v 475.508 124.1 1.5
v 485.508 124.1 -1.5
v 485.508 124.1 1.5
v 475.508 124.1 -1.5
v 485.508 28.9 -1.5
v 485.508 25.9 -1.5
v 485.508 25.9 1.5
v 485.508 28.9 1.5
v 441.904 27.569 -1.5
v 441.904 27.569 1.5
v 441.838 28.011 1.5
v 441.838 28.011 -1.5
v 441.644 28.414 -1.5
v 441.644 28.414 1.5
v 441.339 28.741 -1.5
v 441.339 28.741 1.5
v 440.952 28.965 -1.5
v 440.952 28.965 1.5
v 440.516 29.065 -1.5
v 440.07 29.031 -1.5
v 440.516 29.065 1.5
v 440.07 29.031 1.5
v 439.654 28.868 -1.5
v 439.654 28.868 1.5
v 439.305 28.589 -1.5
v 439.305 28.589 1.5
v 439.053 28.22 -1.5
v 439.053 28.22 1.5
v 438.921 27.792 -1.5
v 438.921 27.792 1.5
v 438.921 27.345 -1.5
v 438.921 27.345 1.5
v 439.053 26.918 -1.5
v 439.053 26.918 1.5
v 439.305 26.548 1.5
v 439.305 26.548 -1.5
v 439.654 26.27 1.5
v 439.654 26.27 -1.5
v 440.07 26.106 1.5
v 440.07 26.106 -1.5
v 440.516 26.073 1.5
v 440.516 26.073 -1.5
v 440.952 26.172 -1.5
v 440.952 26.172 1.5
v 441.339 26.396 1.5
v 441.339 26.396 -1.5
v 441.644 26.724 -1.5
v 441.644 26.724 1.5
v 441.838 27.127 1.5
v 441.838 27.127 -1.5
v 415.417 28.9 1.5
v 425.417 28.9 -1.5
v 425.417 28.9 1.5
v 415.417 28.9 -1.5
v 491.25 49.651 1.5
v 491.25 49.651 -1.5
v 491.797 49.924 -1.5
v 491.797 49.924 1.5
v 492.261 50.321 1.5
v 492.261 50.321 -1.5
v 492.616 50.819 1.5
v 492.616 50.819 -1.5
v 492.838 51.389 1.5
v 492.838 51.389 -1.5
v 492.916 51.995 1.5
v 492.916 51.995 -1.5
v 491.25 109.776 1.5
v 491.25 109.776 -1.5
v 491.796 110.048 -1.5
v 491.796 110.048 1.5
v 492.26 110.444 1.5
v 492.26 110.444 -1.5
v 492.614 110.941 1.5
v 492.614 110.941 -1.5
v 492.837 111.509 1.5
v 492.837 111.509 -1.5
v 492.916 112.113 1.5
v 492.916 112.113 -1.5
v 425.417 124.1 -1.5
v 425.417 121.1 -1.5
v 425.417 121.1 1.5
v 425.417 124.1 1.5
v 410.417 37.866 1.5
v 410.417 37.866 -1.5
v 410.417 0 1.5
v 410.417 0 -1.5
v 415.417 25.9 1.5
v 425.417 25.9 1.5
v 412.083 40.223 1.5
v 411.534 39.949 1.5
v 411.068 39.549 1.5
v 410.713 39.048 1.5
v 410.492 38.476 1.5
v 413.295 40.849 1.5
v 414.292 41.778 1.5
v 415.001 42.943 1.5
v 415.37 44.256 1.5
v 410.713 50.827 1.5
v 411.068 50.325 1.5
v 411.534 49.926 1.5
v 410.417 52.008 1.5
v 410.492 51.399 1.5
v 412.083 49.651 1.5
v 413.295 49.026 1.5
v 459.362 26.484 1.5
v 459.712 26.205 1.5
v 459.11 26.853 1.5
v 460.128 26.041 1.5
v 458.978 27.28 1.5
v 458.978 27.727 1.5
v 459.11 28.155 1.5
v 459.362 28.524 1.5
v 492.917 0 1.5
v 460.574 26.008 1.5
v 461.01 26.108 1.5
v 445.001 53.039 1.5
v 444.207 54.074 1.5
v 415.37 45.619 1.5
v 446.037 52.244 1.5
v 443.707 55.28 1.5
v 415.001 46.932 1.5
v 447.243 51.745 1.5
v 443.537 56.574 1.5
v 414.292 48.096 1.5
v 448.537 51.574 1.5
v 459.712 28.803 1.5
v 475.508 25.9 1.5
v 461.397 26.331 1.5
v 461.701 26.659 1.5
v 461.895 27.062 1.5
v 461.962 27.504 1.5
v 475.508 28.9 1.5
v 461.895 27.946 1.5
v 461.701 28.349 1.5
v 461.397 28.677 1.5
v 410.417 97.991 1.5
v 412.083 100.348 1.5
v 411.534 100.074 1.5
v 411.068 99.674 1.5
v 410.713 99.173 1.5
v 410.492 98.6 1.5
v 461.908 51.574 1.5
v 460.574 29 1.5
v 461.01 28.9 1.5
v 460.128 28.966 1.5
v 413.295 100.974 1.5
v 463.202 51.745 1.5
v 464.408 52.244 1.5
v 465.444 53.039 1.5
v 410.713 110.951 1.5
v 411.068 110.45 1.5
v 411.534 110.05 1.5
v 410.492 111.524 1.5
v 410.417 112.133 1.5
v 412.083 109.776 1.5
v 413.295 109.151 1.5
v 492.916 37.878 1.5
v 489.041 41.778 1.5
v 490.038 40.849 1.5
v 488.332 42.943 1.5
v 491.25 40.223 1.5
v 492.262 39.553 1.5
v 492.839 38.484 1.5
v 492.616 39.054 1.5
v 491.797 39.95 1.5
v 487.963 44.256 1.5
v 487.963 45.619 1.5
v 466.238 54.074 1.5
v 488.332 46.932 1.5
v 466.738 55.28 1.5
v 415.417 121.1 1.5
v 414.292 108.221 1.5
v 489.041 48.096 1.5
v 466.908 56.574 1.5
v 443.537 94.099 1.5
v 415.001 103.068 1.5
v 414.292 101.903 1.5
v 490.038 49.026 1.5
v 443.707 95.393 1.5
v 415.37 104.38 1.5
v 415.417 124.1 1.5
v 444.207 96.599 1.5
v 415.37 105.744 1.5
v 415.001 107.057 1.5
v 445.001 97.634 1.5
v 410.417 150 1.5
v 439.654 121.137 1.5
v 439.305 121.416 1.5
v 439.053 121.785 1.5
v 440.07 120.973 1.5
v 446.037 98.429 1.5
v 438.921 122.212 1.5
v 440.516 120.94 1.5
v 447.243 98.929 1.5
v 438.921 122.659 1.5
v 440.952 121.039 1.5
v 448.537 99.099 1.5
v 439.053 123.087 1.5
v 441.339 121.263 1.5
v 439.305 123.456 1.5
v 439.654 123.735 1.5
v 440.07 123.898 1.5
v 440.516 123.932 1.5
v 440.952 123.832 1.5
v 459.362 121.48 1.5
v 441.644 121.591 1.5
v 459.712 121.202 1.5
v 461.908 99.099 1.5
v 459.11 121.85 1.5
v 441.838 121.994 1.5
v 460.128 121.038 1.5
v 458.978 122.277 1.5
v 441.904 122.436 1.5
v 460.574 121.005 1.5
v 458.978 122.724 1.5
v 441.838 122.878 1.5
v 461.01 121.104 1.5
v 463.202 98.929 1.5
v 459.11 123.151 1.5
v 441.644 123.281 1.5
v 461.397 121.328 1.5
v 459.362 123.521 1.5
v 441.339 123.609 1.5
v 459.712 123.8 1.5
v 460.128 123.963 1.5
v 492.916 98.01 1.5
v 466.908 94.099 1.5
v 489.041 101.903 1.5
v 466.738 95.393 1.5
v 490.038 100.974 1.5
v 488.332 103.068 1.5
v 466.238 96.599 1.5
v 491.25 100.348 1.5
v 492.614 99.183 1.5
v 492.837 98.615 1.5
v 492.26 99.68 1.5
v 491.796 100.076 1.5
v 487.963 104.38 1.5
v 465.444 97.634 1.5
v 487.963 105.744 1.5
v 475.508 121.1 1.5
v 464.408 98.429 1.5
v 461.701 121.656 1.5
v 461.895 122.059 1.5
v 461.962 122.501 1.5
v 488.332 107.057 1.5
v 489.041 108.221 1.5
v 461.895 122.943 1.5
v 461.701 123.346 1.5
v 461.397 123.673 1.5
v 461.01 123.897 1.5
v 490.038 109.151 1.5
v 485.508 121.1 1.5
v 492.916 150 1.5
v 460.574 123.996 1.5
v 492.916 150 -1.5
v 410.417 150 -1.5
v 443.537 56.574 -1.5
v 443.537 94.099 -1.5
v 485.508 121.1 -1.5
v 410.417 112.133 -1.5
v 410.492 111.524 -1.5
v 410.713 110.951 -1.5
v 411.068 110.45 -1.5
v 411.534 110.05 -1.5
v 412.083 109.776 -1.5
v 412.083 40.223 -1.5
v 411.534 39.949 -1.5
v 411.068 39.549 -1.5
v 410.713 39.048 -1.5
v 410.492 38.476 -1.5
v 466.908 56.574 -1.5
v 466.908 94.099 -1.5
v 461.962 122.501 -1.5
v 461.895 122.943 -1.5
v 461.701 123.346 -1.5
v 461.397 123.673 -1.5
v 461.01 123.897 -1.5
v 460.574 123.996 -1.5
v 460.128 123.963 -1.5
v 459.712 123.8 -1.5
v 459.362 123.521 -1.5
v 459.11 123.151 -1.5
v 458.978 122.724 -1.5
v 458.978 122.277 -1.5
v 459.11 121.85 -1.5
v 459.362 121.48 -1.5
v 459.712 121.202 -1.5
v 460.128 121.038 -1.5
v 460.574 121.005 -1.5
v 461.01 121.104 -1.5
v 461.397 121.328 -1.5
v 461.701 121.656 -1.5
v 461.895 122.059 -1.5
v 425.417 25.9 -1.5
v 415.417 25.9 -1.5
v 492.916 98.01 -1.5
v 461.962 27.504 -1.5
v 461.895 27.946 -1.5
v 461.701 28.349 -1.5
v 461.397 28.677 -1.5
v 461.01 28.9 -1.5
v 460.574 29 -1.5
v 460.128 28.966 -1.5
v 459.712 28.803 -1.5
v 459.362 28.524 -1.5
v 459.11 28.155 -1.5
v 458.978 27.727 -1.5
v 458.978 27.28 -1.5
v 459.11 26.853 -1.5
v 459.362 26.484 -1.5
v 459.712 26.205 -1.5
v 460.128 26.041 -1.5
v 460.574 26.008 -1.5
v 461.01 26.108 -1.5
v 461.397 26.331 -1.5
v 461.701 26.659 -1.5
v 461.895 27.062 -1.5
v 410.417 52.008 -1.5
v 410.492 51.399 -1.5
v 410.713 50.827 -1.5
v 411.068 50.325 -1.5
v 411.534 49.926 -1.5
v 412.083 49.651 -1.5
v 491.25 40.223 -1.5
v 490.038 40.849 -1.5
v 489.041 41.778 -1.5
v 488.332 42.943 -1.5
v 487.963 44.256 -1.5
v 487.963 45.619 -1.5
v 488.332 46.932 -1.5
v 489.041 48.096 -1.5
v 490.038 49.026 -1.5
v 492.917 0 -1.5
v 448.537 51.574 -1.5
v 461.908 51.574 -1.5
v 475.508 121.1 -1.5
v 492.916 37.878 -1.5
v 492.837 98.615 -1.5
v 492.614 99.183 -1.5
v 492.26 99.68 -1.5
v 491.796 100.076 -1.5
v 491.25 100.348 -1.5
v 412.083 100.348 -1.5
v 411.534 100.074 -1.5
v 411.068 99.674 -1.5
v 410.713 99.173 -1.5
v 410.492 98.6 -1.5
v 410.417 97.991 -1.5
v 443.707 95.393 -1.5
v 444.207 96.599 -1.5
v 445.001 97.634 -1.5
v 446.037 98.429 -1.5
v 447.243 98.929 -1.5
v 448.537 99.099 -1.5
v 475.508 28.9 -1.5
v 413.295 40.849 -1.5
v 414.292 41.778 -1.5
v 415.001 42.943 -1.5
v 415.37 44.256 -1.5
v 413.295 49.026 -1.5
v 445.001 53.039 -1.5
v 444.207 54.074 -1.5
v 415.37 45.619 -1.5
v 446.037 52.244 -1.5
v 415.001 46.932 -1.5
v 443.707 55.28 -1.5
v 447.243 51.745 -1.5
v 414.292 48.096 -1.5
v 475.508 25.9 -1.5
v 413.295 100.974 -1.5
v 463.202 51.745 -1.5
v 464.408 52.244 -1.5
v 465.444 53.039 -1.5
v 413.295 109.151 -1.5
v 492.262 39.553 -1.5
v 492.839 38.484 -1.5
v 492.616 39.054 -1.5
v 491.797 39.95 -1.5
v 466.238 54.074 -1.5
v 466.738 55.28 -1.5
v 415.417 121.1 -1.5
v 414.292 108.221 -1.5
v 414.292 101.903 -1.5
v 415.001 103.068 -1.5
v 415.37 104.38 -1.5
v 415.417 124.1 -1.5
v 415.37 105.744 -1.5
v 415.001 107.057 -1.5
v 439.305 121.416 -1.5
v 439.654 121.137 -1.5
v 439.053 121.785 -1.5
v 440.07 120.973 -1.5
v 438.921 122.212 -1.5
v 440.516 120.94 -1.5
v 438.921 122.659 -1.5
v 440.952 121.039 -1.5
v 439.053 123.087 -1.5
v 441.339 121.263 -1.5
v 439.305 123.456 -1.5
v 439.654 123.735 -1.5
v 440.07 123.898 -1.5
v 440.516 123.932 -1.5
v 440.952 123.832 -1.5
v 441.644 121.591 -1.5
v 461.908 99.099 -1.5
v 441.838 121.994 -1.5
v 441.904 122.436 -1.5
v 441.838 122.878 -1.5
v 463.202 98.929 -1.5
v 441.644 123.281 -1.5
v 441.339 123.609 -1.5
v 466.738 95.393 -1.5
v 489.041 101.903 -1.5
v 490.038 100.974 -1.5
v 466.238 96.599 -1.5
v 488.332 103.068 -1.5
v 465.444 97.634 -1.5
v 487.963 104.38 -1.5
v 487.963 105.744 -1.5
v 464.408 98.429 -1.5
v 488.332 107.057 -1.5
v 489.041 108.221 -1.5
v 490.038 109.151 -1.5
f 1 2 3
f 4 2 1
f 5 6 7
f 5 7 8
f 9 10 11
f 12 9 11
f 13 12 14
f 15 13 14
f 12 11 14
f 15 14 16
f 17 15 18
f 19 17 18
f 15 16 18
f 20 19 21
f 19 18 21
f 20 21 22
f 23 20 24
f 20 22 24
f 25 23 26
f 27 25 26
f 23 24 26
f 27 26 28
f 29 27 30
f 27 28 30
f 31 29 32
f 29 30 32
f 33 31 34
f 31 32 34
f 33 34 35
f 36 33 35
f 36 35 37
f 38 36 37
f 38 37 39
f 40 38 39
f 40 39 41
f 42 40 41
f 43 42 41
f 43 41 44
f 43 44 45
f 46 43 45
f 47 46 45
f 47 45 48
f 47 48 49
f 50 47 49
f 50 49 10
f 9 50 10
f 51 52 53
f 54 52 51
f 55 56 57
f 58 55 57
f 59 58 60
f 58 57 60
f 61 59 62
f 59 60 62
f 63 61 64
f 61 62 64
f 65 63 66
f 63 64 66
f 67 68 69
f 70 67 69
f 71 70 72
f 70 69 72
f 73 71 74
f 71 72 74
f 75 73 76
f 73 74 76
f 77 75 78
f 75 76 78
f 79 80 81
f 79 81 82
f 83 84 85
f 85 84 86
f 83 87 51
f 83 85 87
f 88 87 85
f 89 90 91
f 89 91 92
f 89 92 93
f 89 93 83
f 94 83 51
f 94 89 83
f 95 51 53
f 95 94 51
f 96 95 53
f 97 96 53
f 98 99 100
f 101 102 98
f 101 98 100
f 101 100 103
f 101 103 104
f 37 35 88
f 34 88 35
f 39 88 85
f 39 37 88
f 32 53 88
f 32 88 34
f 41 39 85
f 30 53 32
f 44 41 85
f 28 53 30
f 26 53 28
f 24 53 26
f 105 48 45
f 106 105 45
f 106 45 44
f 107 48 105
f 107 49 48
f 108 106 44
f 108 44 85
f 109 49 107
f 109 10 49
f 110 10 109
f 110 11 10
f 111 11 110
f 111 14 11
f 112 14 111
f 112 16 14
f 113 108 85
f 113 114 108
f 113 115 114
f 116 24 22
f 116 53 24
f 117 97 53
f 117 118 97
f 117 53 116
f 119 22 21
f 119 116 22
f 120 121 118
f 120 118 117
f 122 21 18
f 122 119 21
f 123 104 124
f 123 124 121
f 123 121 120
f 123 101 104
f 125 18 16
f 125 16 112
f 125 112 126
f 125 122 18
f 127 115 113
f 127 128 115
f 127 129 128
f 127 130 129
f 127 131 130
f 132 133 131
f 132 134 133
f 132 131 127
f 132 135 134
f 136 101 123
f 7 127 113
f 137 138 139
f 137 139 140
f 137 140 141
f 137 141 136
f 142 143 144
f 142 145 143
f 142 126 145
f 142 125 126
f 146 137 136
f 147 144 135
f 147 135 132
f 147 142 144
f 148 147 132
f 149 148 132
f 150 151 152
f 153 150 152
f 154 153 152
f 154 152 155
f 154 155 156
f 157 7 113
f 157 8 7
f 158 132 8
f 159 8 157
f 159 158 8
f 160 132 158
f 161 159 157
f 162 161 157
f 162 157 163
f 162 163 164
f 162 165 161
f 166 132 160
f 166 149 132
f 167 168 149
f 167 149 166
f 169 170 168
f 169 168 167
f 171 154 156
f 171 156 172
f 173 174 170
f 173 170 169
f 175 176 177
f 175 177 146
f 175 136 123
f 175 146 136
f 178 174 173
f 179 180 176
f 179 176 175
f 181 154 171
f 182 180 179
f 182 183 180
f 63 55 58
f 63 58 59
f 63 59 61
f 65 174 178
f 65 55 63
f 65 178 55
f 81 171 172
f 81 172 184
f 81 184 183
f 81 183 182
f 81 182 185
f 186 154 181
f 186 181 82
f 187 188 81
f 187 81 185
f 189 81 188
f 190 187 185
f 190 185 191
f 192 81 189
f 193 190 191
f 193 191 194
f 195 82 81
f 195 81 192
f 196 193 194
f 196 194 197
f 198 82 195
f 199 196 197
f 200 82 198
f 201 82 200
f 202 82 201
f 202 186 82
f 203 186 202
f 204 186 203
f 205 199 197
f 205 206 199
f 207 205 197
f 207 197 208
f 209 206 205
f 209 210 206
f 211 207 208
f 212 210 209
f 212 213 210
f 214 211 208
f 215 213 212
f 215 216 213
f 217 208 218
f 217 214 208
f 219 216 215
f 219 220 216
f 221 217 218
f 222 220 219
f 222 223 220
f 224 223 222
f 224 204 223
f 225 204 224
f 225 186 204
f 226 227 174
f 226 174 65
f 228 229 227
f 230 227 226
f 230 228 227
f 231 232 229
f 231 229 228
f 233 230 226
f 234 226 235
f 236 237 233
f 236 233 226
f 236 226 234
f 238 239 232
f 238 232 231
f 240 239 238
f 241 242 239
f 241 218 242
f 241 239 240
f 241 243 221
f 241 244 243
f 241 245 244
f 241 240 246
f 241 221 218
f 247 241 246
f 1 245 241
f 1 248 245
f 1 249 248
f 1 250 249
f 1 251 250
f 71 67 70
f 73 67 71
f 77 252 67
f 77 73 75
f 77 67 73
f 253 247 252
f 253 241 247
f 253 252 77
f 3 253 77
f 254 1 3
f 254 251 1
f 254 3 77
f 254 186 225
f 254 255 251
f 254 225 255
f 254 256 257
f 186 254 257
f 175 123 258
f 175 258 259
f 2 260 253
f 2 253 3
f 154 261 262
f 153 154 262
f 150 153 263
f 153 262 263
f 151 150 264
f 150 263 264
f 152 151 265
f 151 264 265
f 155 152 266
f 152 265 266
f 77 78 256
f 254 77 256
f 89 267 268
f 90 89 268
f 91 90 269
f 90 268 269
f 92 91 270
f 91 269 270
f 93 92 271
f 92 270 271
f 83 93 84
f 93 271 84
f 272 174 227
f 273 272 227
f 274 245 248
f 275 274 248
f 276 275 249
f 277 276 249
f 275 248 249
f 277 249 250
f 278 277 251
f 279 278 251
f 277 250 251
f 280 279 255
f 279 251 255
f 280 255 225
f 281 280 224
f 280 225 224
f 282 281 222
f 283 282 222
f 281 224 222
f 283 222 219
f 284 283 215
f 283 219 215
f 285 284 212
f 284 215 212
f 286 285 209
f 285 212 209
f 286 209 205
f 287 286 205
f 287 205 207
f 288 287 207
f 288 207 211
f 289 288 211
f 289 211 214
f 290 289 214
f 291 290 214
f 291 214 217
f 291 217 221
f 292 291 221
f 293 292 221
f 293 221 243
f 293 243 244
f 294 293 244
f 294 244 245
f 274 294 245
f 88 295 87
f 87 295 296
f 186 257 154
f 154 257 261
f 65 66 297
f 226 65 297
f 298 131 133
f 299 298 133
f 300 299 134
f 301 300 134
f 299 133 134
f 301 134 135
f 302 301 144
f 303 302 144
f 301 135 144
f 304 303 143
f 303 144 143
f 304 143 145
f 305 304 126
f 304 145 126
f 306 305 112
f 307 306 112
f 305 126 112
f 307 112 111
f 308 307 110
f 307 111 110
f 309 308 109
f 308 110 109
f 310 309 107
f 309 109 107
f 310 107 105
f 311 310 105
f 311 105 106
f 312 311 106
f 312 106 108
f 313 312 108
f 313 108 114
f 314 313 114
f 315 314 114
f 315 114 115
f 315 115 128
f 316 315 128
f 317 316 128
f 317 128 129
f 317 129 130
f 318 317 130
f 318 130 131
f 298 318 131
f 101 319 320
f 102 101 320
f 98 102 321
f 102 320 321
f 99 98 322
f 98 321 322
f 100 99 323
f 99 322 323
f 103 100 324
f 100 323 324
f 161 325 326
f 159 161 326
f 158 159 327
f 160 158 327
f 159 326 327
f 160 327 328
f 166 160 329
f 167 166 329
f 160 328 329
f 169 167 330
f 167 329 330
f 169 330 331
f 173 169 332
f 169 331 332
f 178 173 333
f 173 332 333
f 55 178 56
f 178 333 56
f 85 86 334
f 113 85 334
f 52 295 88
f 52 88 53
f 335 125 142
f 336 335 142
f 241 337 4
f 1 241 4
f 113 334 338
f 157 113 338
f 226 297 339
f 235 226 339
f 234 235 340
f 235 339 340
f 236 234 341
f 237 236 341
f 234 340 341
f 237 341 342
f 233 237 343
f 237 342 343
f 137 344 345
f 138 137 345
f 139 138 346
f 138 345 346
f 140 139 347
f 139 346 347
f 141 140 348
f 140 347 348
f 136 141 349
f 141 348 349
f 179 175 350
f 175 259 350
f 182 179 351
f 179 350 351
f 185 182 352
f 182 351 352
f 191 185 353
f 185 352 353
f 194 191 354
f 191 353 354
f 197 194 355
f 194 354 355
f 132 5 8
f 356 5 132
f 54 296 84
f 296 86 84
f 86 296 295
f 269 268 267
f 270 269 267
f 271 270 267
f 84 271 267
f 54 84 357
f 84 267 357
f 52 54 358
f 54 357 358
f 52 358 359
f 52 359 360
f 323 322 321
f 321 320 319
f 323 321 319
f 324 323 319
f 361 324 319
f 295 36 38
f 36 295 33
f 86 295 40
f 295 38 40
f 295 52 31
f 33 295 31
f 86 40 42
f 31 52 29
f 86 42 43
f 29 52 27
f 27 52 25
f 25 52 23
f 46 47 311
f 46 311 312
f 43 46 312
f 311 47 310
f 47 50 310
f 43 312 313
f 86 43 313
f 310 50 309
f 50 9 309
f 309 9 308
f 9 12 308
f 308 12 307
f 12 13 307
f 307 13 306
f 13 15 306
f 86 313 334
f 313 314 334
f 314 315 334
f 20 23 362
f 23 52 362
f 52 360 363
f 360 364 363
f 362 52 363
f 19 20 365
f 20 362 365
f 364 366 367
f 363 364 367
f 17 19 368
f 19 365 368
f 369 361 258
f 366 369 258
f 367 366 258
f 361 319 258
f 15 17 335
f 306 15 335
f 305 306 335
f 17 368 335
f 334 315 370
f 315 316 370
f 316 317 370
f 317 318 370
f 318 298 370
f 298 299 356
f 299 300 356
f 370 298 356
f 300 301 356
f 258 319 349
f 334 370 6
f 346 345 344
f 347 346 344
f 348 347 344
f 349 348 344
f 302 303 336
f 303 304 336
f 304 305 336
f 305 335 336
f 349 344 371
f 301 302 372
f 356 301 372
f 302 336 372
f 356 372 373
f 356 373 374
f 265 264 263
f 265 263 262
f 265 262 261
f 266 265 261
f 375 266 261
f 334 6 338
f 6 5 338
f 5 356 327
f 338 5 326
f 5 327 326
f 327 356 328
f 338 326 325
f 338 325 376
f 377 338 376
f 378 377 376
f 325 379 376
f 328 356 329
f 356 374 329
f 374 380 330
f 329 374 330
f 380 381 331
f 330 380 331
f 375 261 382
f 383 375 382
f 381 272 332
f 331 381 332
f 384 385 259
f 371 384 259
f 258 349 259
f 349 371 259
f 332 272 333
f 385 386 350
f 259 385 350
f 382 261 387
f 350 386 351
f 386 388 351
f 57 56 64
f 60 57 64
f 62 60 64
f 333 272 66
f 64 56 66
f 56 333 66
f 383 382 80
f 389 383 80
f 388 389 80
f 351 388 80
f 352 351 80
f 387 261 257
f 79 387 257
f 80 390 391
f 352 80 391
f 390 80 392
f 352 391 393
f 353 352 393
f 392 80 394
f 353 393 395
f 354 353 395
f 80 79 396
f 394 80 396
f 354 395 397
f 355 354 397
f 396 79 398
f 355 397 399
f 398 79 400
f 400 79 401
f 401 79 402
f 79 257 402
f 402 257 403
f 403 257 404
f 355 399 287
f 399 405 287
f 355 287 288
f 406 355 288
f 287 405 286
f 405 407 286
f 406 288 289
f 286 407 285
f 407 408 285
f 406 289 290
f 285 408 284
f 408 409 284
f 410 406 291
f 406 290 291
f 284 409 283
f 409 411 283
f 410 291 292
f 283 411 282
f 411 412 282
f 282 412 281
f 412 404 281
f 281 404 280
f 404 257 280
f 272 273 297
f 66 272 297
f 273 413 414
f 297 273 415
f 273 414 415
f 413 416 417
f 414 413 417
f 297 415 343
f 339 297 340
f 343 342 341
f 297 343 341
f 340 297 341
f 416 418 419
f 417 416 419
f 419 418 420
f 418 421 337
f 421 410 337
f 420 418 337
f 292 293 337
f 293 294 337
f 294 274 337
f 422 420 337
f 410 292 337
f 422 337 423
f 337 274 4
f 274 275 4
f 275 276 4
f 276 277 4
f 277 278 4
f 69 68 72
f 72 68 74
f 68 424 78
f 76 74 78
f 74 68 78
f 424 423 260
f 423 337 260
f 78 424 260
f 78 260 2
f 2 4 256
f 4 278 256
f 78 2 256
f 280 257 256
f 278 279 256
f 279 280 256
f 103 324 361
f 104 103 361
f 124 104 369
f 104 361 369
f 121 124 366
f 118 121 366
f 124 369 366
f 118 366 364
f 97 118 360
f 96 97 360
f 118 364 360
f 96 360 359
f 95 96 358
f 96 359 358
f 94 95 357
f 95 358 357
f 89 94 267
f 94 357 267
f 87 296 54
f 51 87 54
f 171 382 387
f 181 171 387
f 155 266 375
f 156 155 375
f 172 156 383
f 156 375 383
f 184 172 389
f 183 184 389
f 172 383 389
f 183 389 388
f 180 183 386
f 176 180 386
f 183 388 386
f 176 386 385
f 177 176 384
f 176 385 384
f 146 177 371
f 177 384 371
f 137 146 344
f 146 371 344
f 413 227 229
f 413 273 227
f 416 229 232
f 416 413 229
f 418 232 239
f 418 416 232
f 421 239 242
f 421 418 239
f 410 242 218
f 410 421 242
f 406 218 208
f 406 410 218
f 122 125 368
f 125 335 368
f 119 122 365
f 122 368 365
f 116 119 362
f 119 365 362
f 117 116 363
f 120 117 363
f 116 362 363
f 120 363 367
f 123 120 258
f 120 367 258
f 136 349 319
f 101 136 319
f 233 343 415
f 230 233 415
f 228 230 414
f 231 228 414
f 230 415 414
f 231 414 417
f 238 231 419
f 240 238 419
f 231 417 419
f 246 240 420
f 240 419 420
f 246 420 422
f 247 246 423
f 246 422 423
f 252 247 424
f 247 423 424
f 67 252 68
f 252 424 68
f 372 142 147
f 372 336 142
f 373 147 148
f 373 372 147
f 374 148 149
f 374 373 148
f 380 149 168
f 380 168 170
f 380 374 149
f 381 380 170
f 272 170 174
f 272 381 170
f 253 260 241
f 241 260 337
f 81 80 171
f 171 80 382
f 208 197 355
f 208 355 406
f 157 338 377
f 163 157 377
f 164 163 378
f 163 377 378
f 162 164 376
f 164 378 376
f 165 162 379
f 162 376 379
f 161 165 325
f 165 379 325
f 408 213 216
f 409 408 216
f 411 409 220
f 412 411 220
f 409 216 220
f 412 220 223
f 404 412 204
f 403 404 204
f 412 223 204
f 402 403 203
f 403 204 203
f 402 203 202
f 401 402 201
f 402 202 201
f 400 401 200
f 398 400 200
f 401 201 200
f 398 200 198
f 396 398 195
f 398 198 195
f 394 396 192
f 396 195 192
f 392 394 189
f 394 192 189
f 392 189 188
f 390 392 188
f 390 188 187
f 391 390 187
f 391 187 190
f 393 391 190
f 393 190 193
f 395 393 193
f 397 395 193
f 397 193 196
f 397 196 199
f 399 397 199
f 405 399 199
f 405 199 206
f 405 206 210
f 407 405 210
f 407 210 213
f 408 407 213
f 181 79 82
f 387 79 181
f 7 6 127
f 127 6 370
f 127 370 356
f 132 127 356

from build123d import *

# Parameters (mm, degrees)
SALIENTE_EXTRUIR1_START = -1.5
SALIENTE_EXTRUIR1_DEPTH = 3
CROQUIS4_W              = 23.371648172
CROQUIS4_H              = 47.52448784
CORTAR_EXTRUIR3_DEPTH   = 10
CROQUIS5_W              = 9.999999994
CROQUIS5_H              = 3
CROQUIS5_W_2            = 9.999999993
CORTAR_EXTRUIR4_DEPTH   = 10
CROQUIS6_R              = 1.5
CORTAR_EXTRUIR5_DEPTH   = 10
REDONDEO1_R             = 5


# Read off the part's stored shape, not the designer's step: Saliente-Extruir1
with BuildPart() as part:
    # Saliente-Extruir1 outline → Saliente-Extruir1 (new body)
    with BuildSketch(Plane.XY.offset(SALIENTE_EXTRUIR1_START)):
        with BuildLine():
            ThreePointArc((492.916449572, 98.009593947), (492.452410006, 99.442022929), (491.249851225, 100.348134338))
            ThreePointArc((491.249851225, 100.348134338), (487.916517891, 105.062179546), (491.249851225, 109.776224754))
            ThreePointArc((491.249851225, 109.776224754), (492.452037009, 110.681812922), (492.916439741, 112.113480025))
            Line((492.916439741, 112.113480025), (492.916413331, 149.999679341))
            Line((492.916413331, 149.999679341), (410.416517891, 149.999679341))
            Line((410.416517891, 149.999679341), (410.416517891, 112.133247358))
            ThreePointArc((410.416517891, 112.133247358), (410.875276439, 110.689871685), (412.083184558, 109.776224754))
            ThreePointArc((412.083184558, 109.776224754), (415.416517891, 105.062179546), (412.083184558, 100.348134338))
            ThreePointArc((412.083184558, 100.348134338), (410.875276439, 99.434487407), (410.416517891, 97.991111734))
            Line((410.416517891, 97.991111734), (410.416517891, 52.008362374))
            ThreePointArc((410.416517891, 52.008362374), (410.875276439, 50.564986701), (412.083184558, 49.65133977))
            ThreePointArc((412.083184558, 49.65133977), (415.416517891, 44.937294562), (412.083184558, 40.223249354))
            ThreePointArc((412.083184558, 40.223249354), (410.875276439, 39.309602423), (410.416517891, 37.86622675))
            Line((410.416517891, 37.86622675), (410.416517891, -0.000320659))
            Line((410.416517891, -0.000320659), (492.916517891, -0.000320659))
            Line((492.916517891, -0.000320659), (492.916491488, 37.877716604))
            ThreePointArc((492.916491488, 37.877716604), (492.45443711, 39.314289338), (491.249851225, 40.223249354))
            ThreePointArc((491.249851225, 40.223249354), (487.916517891, 44.937294562), (491.249851225, 49.65133977))
            ThreePointArc((491.249851225, 49.65133977), (492.453865854, 50.559496169), (492.916481647, 51.994900607))
            Line((492.916481647, 51.994900607), (492.916449572, 98.009593947))
        make_face()
    extrude(amount=SALIENTE_EXTRUIR1_DEPTH)

    # Croquis4 → Cortar-Extruir3 (cut)
    with BuildSketch(Plane.XY.offset(1.5)):
        with Locations((455.222459901, 75.336681949)):
            Rectangle(CROQUIS4_W, CROQUIS4_H)
    extrude(amount=-CORTAR_EXTRUIR3_DEPTH, mode=Mode.SUBTRACT)

    # Croquis5 → Cortar-Extruir4 (cut)
    with BuildSketch(Plane(origin=(0, 0, -1.5), x_dir=(-1, 0, 0), z_dir=(0, 0, -1))):
        with Locations((-420.416517885, 27.399679341)):
            Rectangle(CROQUIS5_W, CROQUIS5_H)
        with Locations((-480.50829052, 27.399679341)):
            Rectangle(CROQUIS5_W_2, CROQUIS5_H)
        with Locations((-480.50829052, 122.599679342)):
            Rectangle(CROQUIS5_W_2, CROQUIS5_H)
        with Locations((-420.416517885, 122.599679342)):
            Rectangle(CROQUIS5_W, CROQUIS5_H)
    extrude(amount=-CORTAR_EXTRUIR4_DEPTH, mode=Mode.SUBTRACT)

    # Croquis6 → Cortar-Extruir5 (cut)
    with BuildSketch(Plane.XY.offset(1.5)):
        with Locations((460.461664074, 27.503843939)):
            Circle(CROQUIS6_R)
        with Locations((440.404261852, 27.568711017)):
            Circle(CROQUIS6_R)
        with Locations((440.404261852, 122.435783537)):
            Circle(CROQUIS6_R)
        with Locations((460.461664074, 122.500650615)):
            Circle(CROQUIS6_R)
    extrude(amount=-CORTAR_EXTRUIR5_DEPTH, mode=Mode.SUBTRACT)

    # Redondeo1
    redondeo1_edges = [part.edges().sort_by_distance(p)[0] for p in [
        (466.908283987, 99.098925869, 0),
        (466.908283987, 51.574438029, 0),
        (443.536635815, 51.574438029, 0),
        (443.536635815, 99.098925869, 0),
    ]]
    fillet(redondeo1_edges, radius=REDONDEO1_R)


solid = part.part
